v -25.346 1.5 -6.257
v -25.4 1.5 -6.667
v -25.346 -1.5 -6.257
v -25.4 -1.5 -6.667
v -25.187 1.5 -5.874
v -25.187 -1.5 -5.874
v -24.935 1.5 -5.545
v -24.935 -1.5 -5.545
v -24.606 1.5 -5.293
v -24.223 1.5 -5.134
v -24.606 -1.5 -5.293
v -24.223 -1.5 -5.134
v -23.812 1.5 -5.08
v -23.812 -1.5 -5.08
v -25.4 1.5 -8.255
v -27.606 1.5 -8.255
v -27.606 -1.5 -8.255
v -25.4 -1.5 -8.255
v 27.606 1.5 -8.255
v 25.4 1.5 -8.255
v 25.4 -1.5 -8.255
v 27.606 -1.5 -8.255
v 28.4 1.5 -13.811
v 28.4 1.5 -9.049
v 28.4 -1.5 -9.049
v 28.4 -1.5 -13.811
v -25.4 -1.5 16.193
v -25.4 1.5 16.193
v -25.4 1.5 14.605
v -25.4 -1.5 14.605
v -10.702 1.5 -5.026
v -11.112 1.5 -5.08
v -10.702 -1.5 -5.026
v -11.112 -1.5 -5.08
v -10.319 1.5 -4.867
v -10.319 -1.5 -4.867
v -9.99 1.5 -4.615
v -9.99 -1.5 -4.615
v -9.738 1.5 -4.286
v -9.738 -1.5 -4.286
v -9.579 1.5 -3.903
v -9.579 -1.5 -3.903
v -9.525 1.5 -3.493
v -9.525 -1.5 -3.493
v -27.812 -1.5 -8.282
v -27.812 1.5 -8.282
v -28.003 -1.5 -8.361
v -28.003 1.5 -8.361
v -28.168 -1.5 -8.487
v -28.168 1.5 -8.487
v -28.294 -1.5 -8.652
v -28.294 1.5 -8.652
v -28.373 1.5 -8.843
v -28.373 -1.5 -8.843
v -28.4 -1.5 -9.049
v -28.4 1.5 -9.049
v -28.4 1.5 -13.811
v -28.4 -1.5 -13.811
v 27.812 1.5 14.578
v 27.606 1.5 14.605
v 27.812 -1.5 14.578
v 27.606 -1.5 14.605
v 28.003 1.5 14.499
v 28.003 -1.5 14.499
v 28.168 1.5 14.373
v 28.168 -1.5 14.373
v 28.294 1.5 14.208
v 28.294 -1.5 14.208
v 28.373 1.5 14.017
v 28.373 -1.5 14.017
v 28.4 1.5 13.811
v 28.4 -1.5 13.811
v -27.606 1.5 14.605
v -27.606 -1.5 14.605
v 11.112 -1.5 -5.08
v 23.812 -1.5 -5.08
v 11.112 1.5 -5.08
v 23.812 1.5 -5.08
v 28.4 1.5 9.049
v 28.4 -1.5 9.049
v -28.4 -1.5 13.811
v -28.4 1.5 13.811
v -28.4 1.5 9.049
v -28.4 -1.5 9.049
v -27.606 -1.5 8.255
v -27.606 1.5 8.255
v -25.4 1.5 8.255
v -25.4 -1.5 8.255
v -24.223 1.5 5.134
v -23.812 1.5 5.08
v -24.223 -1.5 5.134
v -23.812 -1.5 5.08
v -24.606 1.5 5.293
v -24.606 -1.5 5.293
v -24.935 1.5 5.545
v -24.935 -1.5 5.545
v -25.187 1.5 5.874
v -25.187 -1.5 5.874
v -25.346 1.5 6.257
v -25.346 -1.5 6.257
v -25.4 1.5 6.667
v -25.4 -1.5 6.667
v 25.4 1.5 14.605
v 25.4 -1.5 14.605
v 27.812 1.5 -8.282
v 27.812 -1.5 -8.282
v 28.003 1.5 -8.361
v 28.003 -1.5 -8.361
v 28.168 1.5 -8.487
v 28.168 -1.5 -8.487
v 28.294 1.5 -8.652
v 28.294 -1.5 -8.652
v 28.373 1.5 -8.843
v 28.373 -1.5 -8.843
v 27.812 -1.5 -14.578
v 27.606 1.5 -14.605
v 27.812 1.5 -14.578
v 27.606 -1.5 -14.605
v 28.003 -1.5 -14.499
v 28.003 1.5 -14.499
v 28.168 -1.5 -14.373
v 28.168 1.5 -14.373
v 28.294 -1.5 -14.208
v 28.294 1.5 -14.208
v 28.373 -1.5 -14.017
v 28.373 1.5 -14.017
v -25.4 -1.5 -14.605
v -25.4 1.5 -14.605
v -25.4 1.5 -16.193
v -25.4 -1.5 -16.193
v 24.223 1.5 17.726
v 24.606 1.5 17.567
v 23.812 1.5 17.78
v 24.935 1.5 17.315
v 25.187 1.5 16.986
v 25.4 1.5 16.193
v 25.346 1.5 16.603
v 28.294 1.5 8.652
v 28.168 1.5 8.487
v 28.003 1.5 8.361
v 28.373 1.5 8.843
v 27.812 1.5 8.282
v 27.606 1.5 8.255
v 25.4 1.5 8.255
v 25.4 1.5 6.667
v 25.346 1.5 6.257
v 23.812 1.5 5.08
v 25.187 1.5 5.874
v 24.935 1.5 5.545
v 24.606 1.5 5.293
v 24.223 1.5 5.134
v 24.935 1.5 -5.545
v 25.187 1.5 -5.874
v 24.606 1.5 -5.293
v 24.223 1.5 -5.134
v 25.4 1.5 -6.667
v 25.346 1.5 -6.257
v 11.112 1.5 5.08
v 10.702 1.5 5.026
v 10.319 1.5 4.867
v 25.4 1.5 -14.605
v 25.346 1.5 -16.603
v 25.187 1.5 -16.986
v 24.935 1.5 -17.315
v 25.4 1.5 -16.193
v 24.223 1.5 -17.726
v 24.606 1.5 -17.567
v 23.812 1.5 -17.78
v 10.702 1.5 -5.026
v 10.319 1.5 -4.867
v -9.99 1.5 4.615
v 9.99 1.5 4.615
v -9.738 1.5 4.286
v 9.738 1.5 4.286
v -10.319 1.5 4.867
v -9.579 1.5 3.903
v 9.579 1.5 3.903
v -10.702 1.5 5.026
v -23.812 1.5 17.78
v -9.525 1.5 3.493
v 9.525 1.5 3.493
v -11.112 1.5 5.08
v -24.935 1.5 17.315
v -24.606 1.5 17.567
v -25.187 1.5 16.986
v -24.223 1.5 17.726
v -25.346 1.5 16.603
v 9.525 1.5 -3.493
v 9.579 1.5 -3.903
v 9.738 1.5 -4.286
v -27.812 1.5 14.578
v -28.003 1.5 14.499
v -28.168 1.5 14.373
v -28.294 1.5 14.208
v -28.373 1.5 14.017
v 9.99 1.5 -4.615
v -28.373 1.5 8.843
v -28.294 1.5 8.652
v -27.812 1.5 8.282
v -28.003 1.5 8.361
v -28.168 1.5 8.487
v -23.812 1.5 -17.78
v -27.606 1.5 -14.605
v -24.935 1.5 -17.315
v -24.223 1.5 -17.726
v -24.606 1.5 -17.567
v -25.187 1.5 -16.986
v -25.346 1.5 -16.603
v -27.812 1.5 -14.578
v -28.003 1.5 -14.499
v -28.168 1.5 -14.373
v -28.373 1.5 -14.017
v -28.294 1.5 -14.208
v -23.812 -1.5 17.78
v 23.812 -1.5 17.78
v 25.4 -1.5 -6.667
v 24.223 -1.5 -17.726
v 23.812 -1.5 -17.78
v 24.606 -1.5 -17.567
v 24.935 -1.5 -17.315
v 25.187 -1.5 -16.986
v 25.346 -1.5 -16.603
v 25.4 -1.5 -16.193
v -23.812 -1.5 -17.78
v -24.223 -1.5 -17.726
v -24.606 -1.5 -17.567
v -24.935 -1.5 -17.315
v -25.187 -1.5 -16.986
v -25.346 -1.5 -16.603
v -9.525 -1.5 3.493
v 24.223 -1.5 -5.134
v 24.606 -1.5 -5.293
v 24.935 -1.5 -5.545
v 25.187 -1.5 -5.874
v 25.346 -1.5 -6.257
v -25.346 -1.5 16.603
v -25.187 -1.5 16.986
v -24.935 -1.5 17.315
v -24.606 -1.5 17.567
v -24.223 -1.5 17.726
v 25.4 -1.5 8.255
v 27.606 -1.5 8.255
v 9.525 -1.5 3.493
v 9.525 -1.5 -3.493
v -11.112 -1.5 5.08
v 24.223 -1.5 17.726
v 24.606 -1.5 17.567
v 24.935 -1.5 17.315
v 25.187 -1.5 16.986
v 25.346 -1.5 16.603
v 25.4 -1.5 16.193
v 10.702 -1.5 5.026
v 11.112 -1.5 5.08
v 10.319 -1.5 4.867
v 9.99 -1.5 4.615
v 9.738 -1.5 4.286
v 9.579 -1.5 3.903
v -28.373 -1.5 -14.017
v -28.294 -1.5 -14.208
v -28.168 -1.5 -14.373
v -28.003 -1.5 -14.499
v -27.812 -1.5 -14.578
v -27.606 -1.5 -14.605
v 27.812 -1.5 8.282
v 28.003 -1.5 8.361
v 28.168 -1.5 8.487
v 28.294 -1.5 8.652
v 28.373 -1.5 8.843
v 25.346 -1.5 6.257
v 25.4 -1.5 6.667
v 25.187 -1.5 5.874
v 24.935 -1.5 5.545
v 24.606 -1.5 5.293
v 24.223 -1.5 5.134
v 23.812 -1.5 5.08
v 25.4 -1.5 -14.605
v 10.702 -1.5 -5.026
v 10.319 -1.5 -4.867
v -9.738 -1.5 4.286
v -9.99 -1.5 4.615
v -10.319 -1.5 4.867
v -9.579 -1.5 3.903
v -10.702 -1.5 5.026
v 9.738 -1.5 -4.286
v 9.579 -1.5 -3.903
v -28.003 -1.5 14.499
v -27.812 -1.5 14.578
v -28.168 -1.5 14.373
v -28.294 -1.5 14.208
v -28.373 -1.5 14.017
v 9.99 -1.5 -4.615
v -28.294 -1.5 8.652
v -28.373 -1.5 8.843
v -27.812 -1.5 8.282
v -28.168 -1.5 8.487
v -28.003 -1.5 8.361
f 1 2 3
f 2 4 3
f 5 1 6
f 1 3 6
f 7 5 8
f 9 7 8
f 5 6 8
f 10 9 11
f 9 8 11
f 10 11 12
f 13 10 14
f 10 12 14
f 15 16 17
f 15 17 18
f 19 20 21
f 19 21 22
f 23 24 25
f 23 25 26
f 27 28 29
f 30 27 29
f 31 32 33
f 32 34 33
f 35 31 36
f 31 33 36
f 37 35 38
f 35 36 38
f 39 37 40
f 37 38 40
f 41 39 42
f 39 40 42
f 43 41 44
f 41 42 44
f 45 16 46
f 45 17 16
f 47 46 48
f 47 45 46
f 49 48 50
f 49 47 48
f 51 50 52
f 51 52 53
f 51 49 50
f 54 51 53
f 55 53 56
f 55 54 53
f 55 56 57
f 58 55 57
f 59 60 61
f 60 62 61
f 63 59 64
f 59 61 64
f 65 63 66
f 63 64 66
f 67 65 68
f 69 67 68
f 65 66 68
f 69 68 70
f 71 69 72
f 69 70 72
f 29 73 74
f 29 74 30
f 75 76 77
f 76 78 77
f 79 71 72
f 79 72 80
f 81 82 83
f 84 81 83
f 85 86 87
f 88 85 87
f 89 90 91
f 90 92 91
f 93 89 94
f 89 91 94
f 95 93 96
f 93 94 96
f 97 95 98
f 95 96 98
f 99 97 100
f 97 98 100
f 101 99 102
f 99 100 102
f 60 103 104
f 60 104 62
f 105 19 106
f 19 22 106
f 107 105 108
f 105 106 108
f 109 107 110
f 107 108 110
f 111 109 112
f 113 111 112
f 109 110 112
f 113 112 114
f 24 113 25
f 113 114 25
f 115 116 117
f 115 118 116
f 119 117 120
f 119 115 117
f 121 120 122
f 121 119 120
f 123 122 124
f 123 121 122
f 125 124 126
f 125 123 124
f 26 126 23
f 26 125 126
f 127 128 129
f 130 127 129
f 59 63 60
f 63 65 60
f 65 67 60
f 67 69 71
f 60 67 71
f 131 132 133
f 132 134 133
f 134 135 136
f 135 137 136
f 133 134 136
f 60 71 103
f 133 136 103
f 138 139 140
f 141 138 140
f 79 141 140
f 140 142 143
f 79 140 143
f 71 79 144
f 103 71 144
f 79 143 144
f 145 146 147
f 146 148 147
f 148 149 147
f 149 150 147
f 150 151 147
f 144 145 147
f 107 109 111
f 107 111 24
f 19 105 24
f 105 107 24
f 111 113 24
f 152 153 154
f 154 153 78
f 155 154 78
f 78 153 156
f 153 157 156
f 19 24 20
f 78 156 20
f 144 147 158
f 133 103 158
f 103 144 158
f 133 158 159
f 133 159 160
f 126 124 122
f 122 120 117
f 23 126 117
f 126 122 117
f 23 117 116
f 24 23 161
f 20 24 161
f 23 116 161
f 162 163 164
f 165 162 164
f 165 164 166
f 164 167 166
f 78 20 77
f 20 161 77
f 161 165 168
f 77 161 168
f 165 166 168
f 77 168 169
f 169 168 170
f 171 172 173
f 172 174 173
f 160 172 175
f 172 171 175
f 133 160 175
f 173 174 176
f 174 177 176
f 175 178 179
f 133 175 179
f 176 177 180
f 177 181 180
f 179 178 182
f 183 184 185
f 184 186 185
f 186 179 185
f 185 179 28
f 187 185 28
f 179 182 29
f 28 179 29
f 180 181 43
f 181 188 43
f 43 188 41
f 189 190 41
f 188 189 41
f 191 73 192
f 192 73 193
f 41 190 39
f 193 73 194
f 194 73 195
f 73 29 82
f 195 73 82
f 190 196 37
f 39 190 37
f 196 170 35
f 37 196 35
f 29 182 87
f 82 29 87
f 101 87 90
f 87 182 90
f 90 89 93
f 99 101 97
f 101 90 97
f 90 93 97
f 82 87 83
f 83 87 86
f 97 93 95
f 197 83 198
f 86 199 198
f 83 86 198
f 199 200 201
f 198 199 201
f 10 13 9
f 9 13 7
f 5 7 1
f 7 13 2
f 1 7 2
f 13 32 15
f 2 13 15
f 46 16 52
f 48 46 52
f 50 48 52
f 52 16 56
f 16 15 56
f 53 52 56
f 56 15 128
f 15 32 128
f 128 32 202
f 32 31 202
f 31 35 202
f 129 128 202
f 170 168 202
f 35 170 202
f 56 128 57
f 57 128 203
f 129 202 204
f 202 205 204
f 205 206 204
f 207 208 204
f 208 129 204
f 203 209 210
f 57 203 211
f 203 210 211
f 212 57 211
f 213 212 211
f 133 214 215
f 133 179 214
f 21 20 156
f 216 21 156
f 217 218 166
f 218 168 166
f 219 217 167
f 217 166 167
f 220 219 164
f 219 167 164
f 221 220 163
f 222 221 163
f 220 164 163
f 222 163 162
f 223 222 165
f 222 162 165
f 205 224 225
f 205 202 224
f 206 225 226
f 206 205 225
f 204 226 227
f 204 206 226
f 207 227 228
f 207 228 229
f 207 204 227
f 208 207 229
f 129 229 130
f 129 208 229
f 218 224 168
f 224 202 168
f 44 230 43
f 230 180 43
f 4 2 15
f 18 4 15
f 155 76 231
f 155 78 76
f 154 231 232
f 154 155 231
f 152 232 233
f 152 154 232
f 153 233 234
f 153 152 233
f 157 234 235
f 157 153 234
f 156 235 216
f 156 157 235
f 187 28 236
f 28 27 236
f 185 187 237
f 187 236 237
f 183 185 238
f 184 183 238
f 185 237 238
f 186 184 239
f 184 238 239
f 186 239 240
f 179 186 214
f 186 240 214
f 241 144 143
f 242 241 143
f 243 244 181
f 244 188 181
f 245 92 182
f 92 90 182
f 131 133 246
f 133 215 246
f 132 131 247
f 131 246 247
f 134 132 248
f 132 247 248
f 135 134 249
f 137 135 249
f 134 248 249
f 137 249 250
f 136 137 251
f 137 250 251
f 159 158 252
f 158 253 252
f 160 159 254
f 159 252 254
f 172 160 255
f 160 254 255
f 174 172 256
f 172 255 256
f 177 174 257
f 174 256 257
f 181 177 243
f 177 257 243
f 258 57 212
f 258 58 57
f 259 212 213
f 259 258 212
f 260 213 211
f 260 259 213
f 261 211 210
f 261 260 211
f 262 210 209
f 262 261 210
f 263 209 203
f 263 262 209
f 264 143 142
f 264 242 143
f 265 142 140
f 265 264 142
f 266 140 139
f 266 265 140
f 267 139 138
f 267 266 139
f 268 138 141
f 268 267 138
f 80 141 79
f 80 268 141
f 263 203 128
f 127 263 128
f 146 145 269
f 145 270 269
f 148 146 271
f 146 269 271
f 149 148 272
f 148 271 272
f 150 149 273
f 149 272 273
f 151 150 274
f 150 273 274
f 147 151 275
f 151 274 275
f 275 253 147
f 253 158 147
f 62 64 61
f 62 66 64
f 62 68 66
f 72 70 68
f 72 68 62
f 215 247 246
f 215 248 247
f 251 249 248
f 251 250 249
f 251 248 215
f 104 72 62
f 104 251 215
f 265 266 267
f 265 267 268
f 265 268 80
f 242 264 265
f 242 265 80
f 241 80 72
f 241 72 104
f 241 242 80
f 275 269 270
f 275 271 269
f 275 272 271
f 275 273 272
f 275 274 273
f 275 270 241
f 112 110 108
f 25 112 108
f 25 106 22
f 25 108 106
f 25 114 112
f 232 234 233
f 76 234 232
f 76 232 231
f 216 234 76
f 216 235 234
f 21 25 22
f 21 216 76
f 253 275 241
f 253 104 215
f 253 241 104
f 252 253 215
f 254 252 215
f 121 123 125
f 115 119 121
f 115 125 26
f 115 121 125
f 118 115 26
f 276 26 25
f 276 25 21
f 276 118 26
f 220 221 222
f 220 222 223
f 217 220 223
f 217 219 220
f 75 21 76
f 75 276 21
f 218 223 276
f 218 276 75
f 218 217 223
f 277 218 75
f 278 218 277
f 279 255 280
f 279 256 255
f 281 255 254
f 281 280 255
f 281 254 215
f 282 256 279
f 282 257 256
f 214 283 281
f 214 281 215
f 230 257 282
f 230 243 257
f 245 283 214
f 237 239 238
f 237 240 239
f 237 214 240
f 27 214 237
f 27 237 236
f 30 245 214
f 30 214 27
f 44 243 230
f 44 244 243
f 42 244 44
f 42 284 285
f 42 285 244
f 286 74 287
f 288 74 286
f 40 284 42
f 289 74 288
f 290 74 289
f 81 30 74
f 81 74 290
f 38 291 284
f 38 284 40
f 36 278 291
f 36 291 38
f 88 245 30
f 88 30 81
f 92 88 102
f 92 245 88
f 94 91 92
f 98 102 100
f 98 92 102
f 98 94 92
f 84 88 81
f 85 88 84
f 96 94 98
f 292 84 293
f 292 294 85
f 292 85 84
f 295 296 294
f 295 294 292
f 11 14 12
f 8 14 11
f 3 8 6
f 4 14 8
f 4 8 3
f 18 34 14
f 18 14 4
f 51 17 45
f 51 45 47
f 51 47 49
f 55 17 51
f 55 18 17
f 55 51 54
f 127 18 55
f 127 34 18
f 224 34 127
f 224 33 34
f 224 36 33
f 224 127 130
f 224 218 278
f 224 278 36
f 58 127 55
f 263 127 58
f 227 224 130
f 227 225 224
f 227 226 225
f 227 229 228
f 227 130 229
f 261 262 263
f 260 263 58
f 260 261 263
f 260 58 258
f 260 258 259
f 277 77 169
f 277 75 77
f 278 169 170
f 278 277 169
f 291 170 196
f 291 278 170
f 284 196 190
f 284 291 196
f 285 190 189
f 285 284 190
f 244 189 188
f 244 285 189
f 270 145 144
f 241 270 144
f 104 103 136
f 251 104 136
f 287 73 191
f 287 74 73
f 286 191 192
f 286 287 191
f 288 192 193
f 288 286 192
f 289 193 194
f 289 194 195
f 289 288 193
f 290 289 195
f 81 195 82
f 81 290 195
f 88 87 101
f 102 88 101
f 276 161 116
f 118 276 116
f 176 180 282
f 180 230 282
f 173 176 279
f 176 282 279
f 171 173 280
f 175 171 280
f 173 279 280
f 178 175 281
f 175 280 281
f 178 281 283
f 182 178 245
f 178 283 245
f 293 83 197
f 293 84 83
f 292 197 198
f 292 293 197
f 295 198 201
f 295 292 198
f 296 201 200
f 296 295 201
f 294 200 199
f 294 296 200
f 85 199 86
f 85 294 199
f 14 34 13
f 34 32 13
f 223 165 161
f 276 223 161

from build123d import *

# Parameters (mm, degrees)
BOSS_EXTRUDE1_DEPTH = 1.5
FILLET1_R           = 1.5875
SKETCH2_W           = 3
SKETCH2_H           = 6.35
BOSS_EXTRUDE2_DEPTH = 3
FILLET2_R           = 0.79375


with BuildPart() as part:
    # Sketch1 → Boss-Extrude1 (new, symmetric)
    with BuildSketch(Plane(origin=(0, 0, 0), x_dir=(1, 0, 0), z_dir=(0, 1, 0))):
        Polygon((25.4, 5.08), (9.525, 5.08), (9.525, -5.08), (25.4, -5.08), (25.4, -17.78), (6.592009247, -17.78), (0, -17.78), (-12.457990753, -17.78), (-25.4, -17.78), (-25.4, -5.08), (-9.525, -5.08), (-9.525, 5.08), (-25.4, 5.08), (-25.4, 17.78), (25.4, 17.78), align=None)
    extrude(amount=BOSS_EXTRUDE1_DEPTH, both=True)

    # Fillet1
    fillet1_edges = [part.edges().sort_by_distance(p)[0] for p in [
        (25.4, 0, -17.78),
        (25.4, 0, -5.08),
        (9.525, 0, -5.08),
        (9.525, 0, 5.08),
        (25.4, 0, 5.08),
        (25.4, 0, 17.78),
        (-25.4, 0, 17.78),
        (-25.4, 0, 5.08),
        (-9.525, 0, 5.08),
        (-9.525, 0, -5.08),
        (-25.4, 0, -5.08),
        (-25.4, 0, -17.78),
    ]]
    fillet(fillet1_edges, radius=FILLET1_R)

    # Sketch2 → Boss-Extrude2 (add)
    with BuildSketch(Plane(origin=(0, 1.5, 0), x_dir=(1, 0, 0), z_dir=(0, 1, 0))):
        with Locations((-26.9, 11.43)):
            Rectangle(SKETCH2_W, SKETCH2_H)
        with Locations((26.9, 11.43)):
            Rectangle(SKETCH2_W, SKETCH2_H)
        with Locations((26.9, -11.43)):
            Rectangle(SKETCH2_W, SKETCH2_H)
        with Locations((-26.9, -11.43)):
            Rectangle(SKETCH2_W, SKETCH2_H)
    extrude(amount=-BOSS_EXTRUDE2_DEPTH)

    # Fillet2
    fillet2_edges = [part.edges().sort_by_distance(p)[0] for p in [
        (-28.4, 0, 14.605),
        (-28.4, 0, 8.255),
        (28.4, 0, 8.255),
        (28.4, 0, 14.605),
        (28.4, 0, -14.605),
        (28.4, 0, -8.255),
        (-28.4, 0, -8.255),
        (-28.4, 0, -14.605),
    ]]
    fillet(fillet2_edges, radius=FILLET2_R)


solid = part.part
